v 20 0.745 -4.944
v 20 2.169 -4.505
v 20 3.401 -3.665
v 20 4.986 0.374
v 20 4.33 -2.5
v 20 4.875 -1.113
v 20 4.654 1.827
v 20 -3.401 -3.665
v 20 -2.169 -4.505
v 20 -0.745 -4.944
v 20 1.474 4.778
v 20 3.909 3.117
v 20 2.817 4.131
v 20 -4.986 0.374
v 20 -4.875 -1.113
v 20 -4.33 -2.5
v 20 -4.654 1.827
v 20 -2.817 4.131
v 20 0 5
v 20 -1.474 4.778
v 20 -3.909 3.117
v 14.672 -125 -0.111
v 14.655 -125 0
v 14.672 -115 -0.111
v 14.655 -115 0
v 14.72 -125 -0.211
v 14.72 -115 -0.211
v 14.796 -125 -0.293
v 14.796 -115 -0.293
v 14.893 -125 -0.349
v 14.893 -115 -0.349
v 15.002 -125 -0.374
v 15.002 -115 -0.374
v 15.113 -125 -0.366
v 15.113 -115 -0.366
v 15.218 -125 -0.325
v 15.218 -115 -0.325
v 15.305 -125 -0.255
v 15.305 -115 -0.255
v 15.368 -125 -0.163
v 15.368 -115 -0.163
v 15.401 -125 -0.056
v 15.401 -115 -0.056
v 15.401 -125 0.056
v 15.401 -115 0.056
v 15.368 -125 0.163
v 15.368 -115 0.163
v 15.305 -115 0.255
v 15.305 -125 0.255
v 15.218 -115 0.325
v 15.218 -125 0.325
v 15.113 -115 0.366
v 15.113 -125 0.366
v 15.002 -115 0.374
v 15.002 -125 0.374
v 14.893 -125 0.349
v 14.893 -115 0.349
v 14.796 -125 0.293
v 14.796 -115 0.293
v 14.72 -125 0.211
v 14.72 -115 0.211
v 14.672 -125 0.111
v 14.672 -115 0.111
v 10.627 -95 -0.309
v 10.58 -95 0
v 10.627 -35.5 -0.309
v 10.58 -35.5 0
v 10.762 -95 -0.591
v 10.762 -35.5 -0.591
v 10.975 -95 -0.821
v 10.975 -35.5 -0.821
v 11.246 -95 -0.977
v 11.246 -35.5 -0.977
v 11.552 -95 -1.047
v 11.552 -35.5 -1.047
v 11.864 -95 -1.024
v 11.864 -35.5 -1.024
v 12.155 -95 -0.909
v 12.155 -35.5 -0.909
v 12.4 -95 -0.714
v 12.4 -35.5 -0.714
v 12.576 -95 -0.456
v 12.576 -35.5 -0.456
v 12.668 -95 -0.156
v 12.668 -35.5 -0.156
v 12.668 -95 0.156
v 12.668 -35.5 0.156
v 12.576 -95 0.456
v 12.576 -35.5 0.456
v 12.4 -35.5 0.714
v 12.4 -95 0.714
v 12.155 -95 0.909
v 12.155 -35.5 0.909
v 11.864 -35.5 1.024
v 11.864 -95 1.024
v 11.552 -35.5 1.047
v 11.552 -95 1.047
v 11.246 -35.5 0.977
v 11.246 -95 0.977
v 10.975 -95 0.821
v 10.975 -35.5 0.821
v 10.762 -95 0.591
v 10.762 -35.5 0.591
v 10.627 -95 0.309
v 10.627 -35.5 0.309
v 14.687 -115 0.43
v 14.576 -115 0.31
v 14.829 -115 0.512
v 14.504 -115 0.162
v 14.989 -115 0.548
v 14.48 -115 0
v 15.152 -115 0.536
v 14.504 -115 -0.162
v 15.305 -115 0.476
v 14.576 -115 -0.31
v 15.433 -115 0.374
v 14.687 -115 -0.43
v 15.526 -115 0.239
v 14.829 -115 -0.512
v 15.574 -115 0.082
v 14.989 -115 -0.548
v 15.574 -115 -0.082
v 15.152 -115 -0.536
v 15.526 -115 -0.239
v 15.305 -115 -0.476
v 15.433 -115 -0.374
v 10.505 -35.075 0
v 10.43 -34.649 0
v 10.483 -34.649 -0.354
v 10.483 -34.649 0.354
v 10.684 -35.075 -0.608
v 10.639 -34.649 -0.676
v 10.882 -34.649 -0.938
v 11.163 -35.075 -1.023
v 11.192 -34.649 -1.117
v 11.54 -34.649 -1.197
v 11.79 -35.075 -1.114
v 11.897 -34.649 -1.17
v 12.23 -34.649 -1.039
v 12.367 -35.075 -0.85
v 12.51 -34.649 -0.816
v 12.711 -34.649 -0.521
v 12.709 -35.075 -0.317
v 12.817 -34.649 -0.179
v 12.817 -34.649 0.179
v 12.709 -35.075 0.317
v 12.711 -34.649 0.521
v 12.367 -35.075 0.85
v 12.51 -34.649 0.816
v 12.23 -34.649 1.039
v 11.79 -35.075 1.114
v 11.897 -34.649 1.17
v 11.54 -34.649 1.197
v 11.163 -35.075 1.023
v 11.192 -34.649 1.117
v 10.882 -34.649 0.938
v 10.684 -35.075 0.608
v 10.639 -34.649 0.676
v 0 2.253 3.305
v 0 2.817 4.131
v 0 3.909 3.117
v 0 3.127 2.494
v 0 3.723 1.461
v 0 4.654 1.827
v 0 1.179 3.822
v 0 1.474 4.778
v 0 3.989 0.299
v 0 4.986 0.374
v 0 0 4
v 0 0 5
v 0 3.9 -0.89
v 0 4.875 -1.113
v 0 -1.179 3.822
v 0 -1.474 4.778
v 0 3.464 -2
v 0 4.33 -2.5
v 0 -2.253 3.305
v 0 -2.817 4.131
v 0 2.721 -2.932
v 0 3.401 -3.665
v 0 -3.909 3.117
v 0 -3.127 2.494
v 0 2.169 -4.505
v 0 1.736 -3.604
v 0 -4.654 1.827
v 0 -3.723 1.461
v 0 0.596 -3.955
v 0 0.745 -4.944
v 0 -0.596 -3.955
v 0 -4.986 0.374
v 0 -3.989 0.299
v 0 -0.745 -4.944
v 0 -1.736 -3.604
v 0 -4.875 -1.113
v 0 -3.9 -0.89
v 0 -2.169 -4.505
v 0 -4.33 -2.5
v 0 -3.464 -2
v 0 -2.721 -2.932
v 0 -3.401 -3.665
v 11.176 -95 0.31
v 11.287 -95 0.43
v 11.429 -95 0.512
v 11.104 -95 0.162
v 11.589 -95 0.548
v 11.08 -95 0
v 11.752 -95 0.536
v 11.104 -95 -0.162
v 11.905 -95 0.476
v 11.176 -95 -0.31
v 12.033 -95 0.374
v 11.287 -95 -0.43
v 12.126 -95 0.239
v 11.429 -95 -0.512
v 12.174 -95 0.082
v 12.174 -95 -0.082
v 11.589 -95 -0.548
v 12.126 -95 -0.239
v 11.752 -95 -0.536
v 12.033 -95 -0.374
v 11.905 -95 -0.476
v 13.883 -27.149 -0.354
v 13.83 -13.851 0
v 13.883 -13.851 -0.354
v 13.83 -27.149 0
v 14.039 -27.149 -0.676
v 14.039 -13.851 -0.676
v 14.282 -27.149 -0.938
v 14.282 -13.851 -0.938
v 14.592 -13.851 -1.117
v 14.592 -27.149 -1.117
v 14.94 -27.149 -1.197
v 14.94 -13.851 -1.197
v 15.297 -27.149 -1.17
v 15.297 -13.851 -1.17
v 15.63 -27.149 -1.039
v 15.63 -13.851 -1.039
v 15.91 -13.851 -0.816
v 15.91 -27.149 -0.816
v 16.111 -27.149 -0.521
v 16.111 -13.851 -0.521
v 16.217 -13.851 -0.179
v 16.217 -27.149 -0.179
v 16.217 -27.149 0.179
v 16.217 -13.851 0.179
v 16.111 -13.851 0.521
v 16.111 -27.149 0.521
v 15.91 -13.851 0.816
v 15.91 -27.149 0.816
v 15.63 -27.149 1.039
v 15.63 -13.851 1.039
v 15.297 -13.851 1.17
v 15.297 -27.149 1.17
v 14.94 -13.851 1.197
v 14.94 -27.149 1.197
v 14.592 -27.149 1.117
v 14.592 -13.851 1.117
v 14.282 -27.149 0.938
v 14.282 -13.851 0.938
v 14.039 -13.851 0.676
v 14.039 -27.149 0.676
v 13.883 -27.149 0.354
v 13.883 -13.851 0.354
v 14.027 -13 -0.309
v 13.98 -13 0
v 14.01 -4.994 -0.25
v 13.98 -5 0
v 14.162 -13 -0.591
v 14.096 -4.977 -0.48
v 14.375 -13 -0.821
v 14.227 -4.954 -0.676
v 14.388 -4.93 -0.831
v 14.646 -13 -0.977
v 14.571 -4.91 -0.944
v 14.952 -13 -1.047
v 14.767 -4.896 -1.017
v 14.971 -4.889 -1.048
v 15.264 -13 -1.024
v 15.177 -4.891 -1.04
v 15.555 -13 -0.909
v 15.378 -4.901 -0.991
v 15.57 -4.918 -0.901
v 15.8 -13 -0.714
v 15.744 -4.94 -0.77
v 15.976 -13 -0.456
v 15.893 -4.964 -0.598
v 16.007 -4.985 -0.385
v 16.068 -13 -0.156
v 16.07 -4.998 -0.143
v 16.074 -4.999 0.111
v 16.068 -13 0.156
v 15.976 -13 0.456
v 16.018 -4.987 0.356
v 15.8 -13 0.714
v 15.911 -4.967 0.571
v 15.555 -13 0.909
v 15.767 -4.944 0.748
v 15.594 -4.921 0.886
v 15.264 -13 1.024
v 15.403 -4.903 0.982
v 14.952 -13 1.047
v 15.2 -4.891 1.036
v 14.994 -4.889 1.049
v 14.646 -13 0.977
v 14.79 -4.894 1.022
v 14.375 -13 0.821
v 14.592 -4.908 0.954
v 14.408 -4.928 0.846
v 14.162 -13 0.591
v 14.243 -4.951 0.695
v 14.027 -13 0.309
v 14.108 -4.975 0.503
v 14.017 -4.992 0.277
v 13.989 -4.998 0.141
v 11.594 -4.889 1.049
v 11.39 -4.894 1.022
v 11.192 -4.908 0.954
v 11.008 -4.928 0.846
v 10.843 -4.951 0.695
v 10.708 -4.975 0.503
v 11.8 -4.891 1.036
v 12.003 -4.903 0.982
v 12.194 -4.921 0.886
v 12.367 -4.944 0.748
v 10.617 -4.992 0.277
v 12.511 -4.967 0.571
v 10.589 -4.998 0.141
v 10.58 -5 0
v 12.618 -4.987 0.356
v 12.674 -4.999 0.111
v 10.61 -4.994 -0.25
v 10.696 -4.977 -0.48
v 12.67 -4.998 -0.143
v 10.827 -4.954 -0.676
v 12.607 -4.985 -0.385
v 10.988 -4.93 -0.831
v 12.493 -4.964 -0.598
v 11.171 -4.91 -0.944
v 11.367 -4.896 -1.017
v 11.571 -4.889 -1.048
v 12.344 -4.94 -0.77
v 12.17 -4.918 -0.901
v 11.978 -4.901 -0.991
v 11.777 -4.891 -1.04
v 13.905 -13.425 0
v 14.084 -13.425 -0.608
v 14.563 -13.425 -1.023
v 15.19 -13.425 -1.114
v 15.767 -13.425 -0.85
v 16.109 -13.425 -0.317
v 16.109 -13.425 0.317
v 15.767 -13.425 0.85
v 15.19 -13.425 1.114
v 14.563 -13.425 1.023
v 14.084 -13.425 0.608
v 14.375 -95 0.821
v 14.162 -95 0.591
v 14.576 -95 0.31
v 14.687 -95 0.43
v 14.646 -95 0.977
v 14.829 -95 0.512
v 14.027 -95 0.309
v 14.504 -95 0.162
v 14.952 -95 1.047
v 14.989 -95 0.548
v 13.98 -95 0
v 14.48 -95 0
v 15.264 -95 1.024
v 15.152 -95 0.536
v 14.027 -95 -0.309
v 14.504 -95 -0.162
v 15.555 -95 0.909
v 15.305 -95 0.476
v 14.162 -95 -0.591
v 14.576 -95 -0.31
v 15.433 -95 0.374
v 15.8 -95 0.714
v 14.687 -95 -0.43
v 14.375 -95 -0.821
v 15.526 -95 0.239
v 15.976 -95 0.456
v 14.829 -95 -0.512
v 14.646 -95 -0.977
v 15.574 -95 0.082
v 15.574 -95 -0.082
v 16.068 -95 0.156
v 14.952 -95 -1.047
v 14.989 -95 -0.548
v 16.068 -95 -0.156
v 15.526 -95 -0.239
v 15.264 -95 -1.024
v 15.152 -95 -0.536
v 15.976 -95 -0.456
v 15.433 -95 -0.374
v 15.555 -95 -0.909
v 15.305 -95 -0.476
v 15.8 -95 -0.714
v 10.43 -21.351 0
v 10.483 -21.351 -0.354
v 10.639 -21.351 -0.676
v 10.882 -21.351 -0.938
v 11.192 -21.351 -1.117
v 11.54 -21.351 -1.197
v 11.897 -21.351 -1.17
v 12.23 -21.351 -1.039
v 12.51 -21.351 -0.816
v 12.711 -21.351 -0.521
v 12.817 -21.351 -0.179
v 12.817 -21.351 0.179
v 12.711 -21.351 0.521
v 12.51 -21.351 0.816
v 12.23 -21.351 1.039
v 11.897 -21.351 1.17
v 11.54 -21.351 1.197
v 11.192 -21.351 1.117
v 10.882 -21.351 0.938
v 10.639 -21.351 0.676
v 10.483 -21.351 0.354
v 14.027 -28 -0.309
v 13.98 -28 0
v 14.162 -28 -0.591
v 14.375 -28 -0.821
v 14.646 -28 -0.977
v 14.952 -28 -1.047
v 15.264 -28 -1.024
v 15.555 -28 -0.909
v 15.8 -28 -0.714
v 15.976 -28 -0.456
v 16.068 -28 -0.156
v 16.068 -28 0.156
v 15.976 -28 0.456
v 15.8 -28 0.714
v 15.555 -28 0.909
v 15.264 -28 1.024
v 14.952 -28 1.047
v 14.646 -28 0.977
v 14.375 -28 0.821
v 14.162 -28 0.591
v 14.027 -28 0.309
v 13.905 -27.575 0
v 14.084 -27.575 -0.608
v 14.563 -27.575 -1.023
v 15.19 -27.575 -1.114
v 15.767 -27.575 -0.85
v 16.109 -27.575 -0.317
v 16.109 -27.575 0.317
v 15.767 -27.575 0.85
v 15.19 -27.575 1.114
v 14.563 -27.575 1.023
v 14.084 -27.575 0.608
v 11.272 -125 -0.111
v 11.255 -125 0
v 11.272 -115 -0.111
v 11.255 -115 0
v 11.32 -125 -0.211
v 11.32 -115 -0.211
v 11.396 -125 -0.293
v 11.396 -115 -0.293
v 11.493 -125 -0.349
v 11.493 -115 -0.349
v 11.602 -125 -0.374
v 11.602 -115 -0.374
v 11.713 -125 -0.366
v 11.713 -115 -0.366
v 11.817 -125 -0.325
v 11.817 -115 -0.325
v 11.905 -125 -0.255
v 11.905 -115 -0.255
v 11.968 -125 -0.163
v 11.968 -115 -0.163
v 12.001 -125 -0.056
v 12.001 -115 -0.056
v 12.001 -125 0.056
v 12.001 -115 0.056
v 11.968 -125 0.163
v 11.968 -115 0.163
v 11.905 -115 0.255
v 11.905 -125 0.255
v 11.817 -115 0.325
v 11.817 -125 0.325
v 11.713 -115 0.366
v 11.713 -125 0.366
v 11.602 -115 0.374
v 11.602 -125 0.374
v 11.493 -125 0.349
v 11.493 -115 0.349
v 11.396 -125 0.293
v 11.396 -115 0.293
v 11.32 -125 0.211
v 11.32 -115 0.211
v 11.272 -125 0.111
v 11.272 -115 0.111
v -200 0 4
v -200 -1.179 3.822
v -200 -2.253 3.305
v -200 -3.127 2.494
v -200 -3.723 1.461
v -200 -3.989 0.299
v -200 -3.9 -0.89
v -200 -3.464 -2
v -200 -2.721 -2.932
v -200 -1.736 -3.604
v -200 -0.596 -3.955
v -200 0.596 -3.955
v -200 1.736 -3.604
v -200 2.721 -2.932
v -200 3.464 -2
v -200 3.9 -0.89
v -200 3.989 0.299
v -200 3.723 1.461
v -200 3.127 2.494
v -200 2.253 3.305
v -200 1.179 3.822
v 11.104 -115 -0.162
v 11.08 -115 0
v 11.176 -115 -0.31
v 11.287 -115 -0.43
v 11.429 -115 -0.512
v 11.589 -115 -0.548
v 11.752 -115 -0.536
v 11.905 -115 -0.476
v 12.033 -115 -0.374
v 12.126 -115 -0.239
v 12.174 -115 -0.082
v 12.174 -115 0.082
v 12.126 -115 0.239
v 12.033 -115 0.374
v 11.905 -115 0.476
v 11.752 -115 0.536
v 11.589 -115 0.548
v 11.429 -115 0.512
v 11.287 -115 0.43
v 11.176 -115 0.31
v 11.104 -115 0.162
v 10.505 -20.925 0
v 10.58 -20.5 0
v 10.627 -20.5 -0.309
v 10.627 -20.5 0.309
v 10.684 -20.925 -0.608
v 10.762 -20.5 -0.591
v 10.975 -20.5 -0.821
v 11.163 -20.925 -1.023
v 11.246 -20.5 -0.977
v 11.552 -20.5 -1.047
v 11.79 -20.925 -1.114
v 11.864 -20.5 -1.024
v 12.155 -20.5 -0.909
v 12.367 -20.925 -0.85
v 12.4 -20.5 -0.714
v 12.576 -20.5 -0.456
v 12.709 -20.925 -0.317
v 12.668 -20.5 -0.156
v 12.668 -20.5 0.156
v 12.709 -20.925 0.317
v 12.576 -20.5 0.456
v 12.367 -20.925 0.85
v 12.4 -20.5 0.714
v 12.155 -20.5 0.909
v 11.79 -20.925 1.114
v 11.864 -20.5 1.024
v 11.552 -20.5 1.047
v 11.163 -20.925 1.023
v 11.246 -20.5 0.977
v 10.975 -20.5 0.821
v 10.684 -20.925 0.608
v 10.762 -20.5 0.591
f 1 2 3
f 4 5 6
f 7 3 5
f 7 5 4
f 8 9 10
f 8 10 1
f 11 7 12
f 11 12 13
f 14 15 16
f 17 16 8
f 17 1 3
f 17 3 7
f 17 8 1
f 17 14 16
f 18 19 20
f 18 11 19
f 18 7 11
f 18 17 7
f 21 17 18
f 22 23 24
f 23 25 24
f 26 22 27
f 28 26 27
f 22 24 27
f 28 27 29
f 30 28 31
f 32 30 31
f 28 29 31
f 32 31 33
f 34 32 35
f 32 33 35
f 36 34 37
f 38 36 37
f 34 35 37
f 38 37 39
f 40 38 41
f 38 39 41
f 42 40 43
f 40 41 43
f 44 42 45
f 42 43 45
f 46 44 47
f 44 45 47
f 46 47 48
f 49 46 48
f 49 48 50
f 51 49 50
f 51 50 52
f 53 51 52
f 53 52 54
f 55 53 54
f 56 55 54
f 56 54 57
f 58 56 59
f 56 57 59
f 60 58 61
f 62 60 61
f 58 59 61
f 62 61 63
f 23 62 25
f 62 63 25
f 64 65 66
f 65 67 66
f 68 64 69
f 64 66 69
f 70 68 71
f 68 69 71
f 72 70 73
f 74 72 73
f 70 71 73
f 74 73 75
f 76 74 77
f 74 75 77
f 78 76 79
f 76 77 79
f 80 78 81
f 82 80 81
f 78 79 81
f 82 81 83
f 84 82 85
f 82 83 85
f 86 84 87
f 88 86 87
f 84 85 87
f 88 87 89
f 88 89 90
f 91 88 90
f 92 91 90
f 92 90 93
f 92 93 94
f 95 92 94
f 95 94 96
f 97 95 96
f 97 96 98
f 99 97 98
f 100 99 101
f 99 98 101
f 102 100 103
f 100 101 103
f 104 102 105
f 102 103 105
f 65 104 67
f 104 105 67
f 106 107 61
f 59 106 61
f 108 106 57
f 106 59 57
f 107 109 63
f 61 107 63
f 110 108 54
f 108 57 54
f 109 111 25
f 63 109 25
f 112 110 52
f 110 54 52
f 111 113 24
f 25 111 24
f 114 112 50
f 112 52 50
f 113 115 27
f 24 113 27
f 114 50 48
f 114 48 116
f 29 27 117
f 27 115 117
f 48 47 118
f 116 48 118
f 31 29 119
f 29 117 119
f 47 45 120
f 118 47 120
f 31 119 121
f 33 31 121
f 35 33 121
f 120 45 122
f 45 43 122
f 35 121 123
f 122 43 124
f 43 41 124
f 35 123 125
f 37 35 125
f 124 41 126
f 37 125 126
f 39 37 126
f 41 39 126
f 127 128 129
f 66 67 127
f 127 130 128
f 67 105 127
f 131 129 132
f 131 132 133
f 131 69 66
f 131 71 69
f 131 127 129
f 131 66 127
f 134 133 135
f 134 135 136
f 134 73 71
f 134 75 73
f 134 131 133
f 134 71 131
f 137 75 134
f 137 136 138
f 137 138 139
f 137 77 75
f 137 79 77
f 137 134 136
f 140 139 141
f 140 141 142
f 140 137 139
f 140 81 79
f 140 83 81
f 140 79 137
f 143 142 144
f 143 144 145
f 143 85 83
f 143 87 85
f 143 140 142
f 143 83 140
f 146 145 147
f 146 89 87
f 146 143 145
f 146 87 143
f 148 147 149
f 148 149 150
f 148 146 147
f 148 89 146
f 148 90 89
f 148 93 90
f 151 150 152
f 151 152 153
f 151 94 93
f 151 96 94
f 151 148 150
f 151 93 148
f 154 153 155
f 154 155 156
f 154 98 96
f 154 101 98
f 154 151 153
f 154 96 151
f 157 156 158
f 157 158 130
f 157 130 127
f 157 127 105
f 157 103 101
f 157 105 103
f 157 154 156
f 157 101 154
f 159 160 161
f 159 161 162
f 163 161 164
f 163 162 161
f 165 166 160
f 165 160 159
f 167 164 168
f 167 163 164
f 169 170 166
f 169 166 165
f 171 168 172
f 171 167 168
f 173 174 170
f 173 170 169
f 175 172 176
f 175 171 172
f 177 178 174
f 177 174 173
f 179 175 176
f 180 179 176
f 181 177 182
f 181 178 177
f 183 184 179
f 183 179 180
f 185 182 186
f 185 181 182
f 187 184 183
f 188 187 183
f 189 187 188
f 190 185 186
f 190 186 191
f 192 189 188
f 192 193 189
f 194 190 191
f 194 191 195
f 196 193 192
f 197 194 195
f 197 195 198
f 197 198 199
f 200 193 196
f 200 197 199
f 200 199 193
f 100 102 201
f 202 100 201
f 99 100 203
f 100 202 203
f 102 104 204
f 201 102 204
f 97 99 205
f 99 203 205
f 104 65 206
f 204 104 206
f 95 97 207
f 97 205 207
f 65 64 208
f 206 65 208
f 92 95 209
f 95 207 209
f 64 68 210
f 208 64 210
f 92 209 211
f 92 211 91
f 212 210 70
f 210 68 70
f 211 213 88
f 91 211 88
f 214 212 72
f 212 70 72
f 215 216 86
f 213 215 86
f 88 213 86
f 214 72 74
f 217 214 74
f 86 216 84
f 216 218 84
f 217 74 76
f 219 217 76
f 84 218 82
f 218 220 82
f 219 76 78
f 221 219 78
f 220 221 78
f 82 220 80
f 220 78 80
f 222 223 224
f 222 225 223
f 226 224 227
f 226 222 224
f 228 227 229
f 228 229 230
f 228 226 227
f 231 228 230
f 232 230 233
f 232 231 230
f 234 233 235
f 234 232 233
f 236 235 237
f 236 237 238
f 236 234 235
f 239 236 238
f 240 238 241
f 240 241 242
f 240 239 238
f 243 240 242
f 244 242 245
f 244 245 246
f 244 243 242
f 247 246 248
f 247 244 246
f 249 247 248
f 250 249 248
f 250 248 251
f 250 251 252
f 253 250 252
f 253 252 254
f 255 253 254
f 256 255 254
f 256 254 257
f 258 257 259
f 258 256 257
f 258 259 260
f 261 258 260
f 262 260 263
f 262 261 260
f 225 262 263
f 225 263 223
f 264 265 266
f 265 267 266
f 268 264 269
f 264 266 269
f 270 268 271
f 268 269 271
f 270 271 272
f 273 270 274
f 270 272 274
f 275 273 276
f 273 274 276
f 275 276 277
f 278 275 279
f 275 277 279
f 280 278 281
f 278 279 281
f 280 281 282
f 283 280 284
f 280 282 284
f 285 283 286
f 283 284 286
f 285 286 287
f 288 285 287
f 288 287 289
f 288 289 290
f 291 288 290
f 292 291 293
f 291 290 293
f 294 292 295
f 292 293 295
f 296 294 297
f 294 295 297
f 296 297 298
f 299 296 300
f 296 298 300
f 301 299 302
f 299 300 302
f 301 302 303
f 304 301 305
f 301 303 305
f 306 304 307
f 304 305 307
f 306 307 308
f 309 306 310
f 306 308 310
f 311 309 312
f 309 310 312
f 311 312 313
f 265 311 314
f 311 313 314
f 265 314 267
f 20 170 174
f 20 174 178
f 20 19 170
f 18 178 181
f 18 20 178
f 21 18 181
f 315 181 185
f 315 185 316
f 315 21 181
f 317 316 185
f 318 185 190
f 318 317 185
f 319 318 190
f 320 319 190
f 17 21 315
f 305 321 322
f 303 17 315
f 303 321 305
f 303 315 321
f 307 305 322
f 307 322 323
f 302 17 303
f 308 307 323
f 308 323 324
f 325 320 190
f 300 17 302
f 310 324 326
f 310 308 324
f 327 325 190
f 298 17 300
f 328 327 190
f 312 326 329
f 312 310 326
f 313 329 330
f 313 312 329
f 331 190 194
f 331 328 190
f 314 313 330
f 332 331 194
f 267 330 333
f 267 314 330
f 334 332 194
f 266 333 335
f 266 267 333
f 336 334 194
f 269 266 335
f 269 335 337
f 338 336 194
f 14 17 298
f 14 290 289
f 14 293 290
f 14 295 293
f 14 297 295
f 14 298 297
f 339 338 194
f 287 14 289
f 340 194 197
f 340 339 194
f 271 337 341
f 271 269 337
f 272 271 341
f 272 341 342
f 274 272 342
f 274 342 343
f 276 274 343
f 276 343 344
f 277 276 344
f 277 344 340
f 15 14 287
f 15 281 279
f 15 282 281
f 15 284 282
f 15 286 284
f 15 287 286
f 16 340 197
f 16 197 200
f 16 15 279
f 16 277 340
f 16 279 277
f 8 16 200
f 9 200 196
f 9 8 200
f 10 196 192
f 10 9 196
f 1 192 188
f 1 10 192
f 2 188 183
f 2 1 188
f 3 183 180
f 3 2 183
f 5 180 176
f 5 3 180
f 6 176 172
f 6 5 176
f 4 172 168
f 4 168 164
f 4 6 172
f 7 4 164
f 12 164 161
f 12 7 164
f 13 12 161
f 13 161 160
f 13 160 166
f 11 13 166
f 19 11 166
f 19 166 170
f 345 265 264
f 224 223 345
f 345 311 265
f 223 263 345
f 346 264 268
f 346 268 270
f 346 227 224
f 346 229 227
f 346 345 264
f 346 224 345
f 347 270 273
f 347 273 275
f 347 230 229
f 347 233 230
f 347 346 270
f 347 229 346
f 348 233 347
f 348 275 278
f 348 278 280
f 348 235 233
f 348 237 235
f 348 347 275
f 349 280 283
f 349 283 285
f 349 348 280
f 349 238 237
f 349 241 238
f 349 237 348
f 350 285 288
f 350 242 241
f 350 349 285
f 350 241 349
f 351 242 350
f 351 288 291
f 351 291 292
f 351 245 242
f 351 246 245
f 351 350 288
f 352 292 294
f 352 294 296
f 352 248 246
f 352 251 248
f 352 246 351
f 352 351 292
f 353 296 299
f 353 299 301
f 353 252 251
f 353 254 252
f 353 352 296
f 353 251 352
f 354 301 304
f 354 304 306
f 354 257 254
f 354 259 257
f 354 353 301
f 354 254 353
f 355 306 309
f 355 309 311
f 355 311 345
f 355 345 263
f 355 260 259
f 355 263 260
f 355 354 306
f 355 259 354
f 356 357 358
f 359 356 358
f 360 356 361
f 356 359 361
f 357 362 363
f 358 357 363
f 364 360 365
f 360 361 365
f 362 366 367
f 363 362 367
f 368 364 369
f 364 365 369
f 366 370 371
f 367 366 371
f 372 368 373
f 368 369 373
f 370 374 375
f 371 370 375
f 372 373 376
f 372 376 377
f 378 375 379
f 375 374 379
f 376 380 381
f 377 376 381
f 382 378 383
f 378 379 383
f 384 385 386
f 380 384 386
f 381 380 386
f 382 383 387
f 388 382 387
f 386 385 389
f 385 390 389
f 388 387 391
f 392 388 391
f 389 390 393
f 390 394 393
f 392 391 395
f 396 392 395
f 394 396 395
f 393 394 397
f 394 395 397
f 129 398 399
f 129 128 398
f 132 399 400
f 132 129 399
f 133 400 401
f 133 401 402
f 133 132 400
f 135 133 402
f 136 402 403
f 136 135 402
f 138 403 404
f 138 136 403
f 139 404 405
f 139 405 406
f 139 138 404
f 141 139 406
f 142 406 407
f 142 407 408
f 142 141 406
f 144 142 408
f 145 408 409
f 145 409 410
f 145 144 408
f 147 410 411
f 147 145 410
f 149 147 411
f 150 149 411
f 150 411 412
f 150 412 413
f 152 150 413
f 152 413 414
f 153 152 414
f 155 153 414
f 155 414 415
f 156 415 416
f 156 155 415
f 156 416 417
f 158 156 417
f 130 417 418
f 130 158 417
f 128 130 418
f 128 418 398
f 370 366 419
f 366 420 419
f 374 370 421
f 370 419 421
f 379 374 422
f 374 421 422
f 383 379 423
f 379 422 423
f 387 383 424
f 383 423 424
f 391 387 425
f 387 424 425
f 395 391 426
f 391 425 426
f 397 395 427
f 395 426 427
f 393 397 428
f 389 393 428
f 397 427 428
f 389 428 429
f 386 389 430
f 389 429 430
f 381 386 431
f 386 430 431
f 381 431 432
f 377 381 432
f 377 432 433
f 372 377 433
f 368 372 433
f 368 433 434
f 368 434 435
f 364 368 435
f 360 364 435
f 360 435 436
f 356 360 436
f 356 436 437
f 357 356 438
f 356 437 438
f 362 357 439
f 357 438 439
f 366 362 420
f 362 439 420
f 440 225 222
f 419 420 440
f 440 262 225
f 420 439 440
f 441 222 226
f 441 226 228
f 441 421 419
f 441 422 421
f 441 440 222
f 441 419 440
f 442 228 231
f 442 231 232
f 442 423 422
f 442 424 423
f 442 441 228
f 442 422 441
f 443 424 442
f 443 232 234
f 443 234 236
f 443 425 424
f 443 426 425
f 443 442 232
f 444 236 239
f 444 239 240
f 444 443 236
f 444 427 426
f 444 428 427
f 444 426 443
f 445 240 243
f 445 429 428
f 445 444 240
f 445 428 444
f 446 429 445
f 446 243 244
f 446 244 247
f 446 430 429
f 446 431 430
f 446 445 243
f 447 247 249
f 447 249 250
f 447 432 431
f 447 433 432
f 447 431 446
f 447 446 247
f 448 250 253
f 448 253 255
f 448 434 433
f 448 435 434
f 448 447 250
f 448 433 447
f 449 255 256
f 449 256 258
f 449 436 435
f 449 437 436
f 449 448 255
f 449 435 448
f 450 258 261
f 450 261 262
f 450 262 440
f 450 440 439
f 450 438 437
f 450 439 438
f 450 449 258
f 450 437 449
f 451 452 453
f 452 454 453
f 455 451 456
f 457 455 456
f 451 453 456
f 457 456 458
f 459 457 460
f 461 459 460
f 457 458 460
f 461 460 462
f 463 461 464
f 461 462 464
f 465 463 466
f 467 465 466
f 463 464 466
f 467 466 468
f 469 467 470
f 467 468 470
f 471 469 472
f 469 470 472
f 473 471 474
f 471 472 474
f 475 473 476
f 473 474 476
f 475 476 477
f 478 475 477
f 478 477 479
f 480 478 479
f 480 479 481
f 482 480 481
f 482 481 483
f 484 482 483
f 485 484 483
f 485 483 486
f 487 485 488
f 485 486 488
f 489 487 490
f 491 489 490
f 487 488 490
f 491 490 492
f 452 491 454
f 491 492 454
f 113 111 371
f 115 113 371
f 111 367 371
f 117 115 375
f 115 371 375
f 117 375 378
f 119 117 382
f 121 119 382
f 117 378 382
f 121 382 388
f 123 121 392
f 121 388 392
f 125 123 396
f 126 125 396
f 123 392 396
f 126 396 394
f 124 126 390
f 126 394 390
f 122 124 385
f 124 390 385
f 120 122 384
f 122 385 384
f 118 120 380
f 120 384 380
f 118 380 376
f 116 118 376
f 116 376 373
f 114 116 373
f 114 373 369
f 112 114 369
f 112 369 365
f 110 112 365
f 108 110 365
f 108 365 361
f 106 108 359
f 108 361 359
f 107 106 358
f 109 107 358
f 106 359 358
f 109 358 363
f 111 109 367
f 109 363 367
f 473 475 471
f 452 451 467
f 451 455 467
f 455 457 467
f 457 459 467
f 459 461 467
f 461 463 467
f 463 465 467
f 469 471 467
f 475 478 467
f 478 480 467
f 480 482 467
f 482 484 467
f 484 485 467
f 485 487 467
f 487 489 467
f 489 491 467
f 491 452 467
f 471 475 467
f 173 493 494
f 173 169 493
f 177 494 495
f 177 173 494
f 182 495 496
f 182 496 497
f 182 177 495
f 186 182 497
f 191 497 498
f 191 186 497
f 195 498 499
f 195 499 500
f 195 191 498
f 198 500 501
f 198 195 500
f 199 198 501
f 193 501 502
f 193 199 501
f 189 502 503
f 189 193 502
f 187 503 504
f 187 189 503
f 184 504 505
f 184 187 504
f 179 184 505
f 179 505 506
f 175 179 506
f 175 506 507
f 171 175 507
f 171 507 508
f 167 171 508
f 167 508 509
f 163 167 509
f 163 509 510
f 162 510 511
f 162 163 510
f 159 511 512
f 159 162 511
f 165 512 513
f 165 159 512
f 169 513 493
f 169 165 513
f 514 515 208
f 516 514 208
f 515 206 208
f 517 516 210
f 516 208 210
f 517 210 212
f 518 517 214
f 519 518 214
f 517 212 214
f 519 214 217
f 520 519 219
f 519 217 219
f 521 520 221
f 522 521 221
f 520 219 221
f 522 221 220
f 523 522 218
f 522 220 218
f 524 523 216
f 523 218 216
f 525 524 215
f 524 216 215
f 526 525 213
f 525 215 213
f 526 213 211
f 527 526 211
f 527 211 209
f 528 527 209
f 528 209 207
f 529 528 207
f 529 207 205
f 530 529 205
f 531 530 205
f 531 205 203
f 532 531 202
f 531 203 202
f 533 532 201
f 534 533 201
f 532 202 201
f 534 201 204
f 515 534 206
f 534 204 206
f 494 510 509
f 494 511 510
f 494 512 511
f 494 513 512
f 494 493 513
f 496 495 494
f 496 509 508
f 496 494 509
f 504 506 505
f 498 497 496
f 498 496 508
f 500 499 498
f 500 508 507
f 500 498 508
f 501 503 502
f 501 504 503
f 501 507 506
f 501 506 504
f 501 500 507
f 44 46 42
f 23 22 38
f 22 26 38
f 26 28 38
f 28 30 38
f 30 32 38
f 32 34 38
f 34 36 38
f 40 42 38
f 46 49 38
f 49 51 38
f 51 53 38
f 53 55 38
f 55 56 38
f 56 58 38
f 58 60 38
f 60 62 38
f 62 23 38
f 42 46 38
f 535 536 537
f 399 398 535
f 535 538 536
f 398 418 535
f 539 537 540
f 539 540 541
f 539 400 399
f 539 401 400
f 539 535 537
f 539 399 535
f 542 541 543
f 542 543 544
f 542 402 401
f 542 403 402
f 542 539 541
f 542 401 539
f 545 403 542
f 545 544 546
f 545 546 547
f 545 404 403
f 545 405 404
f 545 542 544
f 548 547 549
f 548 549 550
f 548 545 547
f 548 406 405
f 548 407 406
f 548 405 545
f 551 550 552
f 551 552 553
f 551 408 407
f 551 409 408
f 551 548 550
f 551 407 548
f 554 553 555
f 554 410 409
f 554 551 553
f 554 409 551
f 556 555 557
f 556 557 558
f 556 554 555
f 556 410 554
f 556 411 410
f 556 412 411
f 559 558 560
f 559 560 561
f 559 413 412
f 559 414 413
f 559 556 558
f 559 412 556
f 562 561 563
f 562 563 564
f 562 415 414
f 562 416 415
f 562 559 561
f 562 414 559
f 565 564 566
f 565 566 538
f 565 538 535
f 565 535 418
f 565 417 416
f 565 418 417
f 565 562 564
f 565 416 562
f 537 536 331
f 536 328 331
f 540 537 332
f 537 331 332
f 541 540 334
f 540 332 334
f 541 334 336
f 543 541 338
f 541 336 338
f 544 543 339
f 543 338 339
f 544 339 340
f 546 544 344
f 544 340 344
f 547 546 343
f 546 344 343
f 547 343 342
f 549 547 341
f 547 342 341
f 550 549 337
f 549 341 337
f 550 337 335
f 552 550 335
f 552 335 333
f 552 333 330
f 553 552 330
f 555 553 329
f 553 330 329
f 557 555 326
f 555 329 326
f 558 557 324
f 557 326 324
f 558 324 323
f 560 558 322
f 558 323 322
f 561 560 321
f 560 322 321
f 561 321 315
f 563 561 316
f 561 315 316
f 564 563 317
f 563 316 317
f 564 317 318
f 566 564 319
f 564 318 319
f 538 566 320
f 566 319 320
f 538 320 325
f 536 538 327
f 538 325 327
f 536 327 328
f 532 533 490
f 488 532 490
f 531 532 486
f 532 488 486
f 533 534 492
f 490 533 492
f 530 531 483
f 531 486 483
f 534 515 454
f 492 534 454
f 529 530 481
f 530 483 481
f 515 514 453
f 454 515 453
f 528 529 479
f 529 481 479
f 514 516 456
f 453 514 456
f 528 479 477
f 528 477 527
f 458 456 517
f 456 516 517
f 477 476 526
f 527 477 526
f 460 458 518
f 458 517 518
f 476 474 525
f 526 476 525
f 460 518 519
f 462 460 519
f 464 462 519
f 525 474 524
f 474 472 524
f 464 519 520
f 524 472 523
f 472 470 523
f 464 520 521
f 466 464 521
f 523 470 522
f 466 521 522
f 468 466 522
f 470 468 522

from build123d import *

# Parameters (mm, degrees)
LPATTERN1_COUNT = 2
LPATTERN1_PITCH = 3.4


with BuildPart() as part:
    # Sketch1 → Revolve1 (revolve)
    with BuildSketch(Plane.XY, mode=Mode.PRIVATE) as revolve1_sk:
        Polygon((0, 4), (0, 5), (20, 5), (20, 0), (-200, 0), (-200, 4), align=None)
    revolve(revolve1_sk.sketch.rotate(Axis((-200, 0, 0), (1, 0, 0)), 90), axis=Axis((-200, 0, 0), (1, 0, 0)))

    # Sketch2 → Revolve2 (revolve)
    with BuildSketch(Plane.XY, mode=Mode.PRIVATE) as revolve2_sk:
        Polygon((15.405, -125), (15.405, -115), (15.58, -115), (15.58, -95), (16.08, -95), (16.08, 0), (15.03, 0), (15.03, -125), align=None)
    revolve2 = revolve(revolve2_sk.sketch.rotate(Axis((15.03, 0, 0), (0, -1, 0)), 180), axis=Axis((15.03, 0, 0), (0, -1, 0)))

    # LPattern1: Revolve2 ×2
    with Locations(*[(-i * LPATTERN1_PITCH, 0, 0) for i in range(1, LPATTERN1_COUNT)]):
        add(revolve2)

    # Sketch3 → Revolve3 (revolve)
    with BuildSketch(Plane.XY, mode=Mode.PRIVATE) as revolve3_sk:
        Polygon((15.03, -13), (16.08, -13), (16.23, -13.850692273), (16.23, -27.149307727), (16.08, -28), (15.03, -28), align=None)
    revolve(revolve3_sk.sketch.rotate(Axis((15.03, -13, 0), (0, -1, 0)), 180), axis=Axis((15.03, -13, 0), (0, -1, 0)))

    # Sketch4 → Revolve4 (revolve)
    with BuildSketch(Plane.XY, mode=Mode.PRIVATE) as revolve4_sk:
        Polygon((11.63, -20.5), (12.68, -20.5), (12.83, -21.350692273), (12.83, -34.649307727), (12.68, -35.5), (11.63, -35.5), align=None)
    revolve(revolve4_sk.sketch.rotate(Axis((11.63, -20.5, 0), (0, -1, 0)), 180), axis=Axis((11.63, -20.5, 0), (0, -1, 0)))


solid = part.part
